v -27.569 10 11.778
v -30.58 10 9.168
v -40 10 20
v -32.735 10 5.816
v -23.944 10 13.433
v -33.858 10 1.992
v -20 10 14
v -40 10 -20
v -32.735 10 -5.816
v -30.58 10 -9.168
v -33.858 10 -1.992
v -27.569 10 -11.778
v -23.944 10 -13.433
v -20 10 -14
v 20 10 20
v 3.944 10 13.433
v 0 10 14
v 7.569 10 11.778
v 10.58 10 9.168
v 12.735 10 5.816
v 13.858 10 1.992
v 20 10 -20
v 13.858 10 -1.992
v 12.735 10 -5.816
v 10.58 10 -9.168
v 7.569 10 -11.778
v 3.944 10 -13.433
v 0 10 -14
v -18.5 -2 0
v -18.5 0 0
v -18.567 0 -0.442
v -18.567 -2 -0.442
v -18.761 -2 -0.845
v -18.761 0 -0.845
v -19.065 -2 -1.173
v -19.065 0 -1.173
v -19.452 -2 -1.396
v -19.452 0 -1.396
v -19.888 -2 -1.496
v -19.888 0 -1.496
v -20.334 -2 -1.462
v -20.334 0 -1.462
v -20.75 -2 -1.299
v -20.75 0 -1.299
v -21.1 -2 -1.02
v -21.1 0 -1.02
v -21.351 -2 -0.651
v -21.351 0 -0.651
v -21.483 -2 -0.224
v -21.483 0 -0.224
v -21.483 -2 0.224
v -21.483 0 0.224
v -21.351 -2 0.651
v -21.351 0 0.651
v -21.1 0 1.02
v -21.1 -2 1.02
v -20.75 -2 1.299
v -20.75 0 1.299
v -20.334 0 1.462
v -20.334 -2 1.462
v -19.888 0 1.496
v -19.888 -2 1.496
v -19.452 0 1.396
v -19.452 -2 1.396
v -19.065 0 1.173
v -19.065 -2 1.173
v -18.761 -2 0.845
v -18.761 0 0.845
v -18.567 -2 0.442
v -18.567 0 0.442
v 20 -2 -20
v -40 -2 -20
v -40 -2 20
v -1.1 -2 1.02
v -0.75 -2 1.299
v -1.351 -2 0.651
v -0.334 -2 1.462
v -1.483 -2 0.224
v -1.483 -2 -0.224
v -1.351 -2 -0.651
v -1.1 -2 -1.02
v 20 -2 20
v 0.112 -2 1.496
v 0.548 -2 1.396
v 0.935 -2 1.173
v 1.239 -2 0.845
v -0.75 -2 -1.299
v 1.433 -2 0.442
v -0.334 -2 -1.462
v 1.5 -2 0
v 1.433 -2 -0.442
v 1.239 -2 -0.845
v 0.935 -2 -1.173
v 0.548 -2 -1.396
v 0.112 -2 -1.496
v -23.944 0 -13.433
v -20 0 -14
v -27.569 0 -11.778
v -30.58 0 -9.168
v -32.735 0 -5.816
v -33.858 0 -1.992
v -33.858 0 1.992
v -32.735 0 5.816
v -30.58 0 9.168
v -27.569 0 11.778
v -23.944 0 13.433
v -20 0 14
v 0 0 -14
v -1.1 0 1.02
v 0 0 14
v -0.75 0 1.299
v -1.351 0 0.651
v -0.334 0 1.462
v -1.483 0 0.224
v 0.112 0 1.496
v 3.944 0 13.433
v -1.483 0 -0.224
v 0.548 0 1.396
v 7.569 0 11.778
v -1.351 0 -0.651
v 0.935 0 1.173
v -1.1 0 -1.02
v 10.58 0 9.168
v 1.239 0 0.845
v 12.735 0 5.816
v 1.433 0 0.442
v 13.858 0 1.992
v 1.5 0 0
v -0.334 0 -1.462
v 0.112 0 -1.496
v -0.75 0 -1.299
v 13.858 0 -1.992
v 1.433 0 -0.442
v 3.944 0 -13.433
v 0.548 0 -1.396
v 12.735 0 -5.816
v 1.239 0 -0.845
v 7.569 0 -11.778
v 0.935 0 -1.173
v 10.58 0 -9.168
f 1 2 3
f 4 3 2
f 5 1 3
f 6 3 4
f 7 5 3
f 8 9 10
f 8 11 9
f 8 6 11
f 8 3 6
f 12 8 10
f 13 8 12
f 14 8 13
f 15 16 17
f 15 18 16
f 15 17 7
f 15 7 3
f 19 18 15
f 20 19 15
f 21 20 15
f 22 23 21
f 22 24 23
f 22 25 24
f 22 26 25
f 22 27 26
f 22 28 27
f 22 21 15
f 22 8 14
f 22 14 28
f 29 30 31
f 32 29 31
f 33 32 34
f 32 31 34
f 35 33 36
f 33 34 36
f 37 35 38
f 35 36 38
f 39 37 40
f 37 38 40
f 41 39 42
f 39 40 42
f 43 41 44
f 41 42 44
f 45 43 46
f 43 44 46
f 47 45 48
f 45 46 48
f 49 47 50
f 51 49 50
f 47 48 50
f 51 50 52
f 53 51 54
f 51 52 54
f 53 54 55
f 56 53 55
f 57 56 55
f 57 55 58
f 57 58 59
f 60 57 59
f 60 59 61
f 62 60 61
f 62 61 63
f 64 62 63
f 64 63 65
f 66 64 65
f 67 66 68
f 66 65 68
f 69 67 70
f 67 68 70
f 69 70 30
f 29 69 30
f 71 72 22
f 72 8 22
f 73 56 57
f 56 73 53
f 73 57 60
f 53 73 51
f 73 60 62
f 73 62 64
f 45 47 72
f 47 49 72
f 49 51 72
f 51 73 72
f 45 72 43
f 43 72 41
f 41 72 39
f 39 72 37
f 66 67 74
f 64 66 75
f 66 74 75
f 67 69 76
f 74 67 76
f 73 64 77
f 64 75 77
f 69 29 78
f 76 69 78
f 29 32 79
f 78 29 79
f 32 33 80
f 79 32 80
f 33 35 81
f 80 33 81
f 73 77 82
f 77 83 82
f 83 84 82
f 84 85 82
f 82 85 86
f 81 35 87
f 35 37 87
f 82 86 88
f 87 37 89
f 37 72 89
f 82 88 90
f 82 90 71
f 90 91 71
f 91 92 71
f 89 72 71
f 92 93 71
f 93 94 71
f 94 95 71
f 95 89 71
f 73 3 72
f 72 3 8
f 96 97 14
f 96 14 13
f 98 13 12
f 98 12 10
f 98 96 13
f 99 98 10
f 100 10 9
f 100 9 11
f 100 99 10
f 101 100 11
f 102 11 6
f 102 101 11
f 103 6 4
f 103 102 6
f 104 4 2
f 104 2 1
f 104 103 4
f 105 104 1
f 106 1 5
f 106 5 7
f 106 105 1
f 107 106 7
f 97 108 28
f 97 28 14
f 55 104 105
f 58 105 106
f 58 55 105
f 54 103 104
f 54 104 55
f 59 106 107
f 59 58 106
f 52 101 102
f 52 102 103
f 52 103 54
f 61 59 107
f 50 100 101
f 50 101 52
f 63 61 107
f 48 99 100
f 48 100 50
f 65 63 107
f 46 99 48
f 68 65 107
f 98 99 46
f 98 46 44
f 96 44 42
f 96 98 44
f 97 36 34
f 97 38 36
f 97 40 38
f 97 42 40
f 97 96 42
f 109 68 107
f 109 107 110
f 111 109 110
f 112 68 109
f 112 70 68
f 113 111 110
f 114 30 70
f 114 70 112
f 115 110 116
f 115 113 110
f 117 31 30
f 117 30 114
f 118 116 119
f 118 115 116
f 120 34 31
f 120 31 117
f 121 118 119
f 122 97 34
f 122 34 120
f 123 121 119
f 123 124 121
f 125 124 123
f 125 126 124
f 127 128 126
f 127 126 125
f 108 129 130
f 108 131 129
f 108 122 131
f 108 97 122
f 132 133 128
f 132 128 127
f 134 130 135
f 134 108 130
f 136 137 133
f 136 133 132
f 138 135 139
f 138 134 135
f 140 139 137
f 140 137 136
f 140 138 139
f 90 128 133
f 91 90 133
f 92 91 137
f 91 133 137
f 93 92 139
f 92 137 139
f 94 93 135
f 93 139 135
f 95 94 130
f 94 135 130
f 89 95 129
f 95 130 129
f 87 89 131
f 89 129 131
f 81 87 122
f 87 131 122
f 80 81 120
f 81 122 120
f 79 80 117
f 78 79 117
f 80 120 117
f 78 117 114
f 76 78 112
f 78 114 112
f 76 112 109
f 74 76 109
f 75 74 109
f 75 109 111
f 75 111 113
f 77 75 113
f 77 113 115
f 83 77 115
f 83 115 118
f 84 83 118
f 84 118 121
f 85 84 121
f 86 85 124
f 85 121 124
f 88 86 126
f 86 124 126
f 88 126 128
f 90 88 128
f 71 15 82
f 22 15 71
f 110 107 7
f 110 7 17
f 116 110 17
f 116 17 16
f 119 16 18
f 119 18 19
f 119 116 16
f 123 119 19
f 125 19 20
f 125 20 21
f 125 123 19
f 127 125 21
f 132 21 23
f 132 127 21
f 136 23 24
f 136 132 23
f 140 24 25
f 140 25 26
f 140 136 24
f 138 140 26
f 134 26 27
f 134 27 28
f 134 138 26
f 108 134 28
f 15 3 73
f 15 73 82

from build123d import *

# Parameters (mm, degrees)
SKETCH1_W           = 60
SKETCH1_H           = 40
BOSS_EXTRUDE1_DEPTH = 10
SKETCH1_3_W         = 60
SKETCH1_3_H         = 40
SKETCH1_3_R         = 1.5
BOSS_EXTRUDE2_DEPTH = 2


with BuildPart() as part:
    # Sketch1 → Boss-Extrude1 (new body)
    with BuildSketch(Plane(origin=(0, 0, 0), x_dir=(1, 0, 0), z_dir=(0, 1, 0))):
        with Locations((-10, 0)):
            Rectangle(SKETCH1_W, SKETCH1_H)
        with BuildLine():
            ThreePointArc((-20, -14), (-34, 0), (-20, 14))
            Line((-20, 14), (0, 14))
            ThreePointArc((0, 14), (14, 0), (0, -14))
            Line((0, -14), (-20, -14))
        make_face(mode=Mode.SUBTRACT)
    extrude(amount=BOSS_EXTRUDE1_DEPTH)

    # Sketch1<3> → Boss-Extrude2 (add)
    with BuildSketch(Plane(origin=(0, 0, 0), x_dir=(1, 0, 0), z_dir=(0, 1, 0))):
        with Locations((-10, 0)):
            Rectangle(SKETCH1_3_W, SKETCH1_3_H)
        with Locations((-20, 0)):
            Circle(SKETCH1_3_R, mode=Mode.SUBTRACT)
        Circle(SKETCH1_3_R, mode=Mode.SUBTRACT)
    extrude(amount=-BOSS_EXTRUDE2_DEPTH)


solid = part.part
